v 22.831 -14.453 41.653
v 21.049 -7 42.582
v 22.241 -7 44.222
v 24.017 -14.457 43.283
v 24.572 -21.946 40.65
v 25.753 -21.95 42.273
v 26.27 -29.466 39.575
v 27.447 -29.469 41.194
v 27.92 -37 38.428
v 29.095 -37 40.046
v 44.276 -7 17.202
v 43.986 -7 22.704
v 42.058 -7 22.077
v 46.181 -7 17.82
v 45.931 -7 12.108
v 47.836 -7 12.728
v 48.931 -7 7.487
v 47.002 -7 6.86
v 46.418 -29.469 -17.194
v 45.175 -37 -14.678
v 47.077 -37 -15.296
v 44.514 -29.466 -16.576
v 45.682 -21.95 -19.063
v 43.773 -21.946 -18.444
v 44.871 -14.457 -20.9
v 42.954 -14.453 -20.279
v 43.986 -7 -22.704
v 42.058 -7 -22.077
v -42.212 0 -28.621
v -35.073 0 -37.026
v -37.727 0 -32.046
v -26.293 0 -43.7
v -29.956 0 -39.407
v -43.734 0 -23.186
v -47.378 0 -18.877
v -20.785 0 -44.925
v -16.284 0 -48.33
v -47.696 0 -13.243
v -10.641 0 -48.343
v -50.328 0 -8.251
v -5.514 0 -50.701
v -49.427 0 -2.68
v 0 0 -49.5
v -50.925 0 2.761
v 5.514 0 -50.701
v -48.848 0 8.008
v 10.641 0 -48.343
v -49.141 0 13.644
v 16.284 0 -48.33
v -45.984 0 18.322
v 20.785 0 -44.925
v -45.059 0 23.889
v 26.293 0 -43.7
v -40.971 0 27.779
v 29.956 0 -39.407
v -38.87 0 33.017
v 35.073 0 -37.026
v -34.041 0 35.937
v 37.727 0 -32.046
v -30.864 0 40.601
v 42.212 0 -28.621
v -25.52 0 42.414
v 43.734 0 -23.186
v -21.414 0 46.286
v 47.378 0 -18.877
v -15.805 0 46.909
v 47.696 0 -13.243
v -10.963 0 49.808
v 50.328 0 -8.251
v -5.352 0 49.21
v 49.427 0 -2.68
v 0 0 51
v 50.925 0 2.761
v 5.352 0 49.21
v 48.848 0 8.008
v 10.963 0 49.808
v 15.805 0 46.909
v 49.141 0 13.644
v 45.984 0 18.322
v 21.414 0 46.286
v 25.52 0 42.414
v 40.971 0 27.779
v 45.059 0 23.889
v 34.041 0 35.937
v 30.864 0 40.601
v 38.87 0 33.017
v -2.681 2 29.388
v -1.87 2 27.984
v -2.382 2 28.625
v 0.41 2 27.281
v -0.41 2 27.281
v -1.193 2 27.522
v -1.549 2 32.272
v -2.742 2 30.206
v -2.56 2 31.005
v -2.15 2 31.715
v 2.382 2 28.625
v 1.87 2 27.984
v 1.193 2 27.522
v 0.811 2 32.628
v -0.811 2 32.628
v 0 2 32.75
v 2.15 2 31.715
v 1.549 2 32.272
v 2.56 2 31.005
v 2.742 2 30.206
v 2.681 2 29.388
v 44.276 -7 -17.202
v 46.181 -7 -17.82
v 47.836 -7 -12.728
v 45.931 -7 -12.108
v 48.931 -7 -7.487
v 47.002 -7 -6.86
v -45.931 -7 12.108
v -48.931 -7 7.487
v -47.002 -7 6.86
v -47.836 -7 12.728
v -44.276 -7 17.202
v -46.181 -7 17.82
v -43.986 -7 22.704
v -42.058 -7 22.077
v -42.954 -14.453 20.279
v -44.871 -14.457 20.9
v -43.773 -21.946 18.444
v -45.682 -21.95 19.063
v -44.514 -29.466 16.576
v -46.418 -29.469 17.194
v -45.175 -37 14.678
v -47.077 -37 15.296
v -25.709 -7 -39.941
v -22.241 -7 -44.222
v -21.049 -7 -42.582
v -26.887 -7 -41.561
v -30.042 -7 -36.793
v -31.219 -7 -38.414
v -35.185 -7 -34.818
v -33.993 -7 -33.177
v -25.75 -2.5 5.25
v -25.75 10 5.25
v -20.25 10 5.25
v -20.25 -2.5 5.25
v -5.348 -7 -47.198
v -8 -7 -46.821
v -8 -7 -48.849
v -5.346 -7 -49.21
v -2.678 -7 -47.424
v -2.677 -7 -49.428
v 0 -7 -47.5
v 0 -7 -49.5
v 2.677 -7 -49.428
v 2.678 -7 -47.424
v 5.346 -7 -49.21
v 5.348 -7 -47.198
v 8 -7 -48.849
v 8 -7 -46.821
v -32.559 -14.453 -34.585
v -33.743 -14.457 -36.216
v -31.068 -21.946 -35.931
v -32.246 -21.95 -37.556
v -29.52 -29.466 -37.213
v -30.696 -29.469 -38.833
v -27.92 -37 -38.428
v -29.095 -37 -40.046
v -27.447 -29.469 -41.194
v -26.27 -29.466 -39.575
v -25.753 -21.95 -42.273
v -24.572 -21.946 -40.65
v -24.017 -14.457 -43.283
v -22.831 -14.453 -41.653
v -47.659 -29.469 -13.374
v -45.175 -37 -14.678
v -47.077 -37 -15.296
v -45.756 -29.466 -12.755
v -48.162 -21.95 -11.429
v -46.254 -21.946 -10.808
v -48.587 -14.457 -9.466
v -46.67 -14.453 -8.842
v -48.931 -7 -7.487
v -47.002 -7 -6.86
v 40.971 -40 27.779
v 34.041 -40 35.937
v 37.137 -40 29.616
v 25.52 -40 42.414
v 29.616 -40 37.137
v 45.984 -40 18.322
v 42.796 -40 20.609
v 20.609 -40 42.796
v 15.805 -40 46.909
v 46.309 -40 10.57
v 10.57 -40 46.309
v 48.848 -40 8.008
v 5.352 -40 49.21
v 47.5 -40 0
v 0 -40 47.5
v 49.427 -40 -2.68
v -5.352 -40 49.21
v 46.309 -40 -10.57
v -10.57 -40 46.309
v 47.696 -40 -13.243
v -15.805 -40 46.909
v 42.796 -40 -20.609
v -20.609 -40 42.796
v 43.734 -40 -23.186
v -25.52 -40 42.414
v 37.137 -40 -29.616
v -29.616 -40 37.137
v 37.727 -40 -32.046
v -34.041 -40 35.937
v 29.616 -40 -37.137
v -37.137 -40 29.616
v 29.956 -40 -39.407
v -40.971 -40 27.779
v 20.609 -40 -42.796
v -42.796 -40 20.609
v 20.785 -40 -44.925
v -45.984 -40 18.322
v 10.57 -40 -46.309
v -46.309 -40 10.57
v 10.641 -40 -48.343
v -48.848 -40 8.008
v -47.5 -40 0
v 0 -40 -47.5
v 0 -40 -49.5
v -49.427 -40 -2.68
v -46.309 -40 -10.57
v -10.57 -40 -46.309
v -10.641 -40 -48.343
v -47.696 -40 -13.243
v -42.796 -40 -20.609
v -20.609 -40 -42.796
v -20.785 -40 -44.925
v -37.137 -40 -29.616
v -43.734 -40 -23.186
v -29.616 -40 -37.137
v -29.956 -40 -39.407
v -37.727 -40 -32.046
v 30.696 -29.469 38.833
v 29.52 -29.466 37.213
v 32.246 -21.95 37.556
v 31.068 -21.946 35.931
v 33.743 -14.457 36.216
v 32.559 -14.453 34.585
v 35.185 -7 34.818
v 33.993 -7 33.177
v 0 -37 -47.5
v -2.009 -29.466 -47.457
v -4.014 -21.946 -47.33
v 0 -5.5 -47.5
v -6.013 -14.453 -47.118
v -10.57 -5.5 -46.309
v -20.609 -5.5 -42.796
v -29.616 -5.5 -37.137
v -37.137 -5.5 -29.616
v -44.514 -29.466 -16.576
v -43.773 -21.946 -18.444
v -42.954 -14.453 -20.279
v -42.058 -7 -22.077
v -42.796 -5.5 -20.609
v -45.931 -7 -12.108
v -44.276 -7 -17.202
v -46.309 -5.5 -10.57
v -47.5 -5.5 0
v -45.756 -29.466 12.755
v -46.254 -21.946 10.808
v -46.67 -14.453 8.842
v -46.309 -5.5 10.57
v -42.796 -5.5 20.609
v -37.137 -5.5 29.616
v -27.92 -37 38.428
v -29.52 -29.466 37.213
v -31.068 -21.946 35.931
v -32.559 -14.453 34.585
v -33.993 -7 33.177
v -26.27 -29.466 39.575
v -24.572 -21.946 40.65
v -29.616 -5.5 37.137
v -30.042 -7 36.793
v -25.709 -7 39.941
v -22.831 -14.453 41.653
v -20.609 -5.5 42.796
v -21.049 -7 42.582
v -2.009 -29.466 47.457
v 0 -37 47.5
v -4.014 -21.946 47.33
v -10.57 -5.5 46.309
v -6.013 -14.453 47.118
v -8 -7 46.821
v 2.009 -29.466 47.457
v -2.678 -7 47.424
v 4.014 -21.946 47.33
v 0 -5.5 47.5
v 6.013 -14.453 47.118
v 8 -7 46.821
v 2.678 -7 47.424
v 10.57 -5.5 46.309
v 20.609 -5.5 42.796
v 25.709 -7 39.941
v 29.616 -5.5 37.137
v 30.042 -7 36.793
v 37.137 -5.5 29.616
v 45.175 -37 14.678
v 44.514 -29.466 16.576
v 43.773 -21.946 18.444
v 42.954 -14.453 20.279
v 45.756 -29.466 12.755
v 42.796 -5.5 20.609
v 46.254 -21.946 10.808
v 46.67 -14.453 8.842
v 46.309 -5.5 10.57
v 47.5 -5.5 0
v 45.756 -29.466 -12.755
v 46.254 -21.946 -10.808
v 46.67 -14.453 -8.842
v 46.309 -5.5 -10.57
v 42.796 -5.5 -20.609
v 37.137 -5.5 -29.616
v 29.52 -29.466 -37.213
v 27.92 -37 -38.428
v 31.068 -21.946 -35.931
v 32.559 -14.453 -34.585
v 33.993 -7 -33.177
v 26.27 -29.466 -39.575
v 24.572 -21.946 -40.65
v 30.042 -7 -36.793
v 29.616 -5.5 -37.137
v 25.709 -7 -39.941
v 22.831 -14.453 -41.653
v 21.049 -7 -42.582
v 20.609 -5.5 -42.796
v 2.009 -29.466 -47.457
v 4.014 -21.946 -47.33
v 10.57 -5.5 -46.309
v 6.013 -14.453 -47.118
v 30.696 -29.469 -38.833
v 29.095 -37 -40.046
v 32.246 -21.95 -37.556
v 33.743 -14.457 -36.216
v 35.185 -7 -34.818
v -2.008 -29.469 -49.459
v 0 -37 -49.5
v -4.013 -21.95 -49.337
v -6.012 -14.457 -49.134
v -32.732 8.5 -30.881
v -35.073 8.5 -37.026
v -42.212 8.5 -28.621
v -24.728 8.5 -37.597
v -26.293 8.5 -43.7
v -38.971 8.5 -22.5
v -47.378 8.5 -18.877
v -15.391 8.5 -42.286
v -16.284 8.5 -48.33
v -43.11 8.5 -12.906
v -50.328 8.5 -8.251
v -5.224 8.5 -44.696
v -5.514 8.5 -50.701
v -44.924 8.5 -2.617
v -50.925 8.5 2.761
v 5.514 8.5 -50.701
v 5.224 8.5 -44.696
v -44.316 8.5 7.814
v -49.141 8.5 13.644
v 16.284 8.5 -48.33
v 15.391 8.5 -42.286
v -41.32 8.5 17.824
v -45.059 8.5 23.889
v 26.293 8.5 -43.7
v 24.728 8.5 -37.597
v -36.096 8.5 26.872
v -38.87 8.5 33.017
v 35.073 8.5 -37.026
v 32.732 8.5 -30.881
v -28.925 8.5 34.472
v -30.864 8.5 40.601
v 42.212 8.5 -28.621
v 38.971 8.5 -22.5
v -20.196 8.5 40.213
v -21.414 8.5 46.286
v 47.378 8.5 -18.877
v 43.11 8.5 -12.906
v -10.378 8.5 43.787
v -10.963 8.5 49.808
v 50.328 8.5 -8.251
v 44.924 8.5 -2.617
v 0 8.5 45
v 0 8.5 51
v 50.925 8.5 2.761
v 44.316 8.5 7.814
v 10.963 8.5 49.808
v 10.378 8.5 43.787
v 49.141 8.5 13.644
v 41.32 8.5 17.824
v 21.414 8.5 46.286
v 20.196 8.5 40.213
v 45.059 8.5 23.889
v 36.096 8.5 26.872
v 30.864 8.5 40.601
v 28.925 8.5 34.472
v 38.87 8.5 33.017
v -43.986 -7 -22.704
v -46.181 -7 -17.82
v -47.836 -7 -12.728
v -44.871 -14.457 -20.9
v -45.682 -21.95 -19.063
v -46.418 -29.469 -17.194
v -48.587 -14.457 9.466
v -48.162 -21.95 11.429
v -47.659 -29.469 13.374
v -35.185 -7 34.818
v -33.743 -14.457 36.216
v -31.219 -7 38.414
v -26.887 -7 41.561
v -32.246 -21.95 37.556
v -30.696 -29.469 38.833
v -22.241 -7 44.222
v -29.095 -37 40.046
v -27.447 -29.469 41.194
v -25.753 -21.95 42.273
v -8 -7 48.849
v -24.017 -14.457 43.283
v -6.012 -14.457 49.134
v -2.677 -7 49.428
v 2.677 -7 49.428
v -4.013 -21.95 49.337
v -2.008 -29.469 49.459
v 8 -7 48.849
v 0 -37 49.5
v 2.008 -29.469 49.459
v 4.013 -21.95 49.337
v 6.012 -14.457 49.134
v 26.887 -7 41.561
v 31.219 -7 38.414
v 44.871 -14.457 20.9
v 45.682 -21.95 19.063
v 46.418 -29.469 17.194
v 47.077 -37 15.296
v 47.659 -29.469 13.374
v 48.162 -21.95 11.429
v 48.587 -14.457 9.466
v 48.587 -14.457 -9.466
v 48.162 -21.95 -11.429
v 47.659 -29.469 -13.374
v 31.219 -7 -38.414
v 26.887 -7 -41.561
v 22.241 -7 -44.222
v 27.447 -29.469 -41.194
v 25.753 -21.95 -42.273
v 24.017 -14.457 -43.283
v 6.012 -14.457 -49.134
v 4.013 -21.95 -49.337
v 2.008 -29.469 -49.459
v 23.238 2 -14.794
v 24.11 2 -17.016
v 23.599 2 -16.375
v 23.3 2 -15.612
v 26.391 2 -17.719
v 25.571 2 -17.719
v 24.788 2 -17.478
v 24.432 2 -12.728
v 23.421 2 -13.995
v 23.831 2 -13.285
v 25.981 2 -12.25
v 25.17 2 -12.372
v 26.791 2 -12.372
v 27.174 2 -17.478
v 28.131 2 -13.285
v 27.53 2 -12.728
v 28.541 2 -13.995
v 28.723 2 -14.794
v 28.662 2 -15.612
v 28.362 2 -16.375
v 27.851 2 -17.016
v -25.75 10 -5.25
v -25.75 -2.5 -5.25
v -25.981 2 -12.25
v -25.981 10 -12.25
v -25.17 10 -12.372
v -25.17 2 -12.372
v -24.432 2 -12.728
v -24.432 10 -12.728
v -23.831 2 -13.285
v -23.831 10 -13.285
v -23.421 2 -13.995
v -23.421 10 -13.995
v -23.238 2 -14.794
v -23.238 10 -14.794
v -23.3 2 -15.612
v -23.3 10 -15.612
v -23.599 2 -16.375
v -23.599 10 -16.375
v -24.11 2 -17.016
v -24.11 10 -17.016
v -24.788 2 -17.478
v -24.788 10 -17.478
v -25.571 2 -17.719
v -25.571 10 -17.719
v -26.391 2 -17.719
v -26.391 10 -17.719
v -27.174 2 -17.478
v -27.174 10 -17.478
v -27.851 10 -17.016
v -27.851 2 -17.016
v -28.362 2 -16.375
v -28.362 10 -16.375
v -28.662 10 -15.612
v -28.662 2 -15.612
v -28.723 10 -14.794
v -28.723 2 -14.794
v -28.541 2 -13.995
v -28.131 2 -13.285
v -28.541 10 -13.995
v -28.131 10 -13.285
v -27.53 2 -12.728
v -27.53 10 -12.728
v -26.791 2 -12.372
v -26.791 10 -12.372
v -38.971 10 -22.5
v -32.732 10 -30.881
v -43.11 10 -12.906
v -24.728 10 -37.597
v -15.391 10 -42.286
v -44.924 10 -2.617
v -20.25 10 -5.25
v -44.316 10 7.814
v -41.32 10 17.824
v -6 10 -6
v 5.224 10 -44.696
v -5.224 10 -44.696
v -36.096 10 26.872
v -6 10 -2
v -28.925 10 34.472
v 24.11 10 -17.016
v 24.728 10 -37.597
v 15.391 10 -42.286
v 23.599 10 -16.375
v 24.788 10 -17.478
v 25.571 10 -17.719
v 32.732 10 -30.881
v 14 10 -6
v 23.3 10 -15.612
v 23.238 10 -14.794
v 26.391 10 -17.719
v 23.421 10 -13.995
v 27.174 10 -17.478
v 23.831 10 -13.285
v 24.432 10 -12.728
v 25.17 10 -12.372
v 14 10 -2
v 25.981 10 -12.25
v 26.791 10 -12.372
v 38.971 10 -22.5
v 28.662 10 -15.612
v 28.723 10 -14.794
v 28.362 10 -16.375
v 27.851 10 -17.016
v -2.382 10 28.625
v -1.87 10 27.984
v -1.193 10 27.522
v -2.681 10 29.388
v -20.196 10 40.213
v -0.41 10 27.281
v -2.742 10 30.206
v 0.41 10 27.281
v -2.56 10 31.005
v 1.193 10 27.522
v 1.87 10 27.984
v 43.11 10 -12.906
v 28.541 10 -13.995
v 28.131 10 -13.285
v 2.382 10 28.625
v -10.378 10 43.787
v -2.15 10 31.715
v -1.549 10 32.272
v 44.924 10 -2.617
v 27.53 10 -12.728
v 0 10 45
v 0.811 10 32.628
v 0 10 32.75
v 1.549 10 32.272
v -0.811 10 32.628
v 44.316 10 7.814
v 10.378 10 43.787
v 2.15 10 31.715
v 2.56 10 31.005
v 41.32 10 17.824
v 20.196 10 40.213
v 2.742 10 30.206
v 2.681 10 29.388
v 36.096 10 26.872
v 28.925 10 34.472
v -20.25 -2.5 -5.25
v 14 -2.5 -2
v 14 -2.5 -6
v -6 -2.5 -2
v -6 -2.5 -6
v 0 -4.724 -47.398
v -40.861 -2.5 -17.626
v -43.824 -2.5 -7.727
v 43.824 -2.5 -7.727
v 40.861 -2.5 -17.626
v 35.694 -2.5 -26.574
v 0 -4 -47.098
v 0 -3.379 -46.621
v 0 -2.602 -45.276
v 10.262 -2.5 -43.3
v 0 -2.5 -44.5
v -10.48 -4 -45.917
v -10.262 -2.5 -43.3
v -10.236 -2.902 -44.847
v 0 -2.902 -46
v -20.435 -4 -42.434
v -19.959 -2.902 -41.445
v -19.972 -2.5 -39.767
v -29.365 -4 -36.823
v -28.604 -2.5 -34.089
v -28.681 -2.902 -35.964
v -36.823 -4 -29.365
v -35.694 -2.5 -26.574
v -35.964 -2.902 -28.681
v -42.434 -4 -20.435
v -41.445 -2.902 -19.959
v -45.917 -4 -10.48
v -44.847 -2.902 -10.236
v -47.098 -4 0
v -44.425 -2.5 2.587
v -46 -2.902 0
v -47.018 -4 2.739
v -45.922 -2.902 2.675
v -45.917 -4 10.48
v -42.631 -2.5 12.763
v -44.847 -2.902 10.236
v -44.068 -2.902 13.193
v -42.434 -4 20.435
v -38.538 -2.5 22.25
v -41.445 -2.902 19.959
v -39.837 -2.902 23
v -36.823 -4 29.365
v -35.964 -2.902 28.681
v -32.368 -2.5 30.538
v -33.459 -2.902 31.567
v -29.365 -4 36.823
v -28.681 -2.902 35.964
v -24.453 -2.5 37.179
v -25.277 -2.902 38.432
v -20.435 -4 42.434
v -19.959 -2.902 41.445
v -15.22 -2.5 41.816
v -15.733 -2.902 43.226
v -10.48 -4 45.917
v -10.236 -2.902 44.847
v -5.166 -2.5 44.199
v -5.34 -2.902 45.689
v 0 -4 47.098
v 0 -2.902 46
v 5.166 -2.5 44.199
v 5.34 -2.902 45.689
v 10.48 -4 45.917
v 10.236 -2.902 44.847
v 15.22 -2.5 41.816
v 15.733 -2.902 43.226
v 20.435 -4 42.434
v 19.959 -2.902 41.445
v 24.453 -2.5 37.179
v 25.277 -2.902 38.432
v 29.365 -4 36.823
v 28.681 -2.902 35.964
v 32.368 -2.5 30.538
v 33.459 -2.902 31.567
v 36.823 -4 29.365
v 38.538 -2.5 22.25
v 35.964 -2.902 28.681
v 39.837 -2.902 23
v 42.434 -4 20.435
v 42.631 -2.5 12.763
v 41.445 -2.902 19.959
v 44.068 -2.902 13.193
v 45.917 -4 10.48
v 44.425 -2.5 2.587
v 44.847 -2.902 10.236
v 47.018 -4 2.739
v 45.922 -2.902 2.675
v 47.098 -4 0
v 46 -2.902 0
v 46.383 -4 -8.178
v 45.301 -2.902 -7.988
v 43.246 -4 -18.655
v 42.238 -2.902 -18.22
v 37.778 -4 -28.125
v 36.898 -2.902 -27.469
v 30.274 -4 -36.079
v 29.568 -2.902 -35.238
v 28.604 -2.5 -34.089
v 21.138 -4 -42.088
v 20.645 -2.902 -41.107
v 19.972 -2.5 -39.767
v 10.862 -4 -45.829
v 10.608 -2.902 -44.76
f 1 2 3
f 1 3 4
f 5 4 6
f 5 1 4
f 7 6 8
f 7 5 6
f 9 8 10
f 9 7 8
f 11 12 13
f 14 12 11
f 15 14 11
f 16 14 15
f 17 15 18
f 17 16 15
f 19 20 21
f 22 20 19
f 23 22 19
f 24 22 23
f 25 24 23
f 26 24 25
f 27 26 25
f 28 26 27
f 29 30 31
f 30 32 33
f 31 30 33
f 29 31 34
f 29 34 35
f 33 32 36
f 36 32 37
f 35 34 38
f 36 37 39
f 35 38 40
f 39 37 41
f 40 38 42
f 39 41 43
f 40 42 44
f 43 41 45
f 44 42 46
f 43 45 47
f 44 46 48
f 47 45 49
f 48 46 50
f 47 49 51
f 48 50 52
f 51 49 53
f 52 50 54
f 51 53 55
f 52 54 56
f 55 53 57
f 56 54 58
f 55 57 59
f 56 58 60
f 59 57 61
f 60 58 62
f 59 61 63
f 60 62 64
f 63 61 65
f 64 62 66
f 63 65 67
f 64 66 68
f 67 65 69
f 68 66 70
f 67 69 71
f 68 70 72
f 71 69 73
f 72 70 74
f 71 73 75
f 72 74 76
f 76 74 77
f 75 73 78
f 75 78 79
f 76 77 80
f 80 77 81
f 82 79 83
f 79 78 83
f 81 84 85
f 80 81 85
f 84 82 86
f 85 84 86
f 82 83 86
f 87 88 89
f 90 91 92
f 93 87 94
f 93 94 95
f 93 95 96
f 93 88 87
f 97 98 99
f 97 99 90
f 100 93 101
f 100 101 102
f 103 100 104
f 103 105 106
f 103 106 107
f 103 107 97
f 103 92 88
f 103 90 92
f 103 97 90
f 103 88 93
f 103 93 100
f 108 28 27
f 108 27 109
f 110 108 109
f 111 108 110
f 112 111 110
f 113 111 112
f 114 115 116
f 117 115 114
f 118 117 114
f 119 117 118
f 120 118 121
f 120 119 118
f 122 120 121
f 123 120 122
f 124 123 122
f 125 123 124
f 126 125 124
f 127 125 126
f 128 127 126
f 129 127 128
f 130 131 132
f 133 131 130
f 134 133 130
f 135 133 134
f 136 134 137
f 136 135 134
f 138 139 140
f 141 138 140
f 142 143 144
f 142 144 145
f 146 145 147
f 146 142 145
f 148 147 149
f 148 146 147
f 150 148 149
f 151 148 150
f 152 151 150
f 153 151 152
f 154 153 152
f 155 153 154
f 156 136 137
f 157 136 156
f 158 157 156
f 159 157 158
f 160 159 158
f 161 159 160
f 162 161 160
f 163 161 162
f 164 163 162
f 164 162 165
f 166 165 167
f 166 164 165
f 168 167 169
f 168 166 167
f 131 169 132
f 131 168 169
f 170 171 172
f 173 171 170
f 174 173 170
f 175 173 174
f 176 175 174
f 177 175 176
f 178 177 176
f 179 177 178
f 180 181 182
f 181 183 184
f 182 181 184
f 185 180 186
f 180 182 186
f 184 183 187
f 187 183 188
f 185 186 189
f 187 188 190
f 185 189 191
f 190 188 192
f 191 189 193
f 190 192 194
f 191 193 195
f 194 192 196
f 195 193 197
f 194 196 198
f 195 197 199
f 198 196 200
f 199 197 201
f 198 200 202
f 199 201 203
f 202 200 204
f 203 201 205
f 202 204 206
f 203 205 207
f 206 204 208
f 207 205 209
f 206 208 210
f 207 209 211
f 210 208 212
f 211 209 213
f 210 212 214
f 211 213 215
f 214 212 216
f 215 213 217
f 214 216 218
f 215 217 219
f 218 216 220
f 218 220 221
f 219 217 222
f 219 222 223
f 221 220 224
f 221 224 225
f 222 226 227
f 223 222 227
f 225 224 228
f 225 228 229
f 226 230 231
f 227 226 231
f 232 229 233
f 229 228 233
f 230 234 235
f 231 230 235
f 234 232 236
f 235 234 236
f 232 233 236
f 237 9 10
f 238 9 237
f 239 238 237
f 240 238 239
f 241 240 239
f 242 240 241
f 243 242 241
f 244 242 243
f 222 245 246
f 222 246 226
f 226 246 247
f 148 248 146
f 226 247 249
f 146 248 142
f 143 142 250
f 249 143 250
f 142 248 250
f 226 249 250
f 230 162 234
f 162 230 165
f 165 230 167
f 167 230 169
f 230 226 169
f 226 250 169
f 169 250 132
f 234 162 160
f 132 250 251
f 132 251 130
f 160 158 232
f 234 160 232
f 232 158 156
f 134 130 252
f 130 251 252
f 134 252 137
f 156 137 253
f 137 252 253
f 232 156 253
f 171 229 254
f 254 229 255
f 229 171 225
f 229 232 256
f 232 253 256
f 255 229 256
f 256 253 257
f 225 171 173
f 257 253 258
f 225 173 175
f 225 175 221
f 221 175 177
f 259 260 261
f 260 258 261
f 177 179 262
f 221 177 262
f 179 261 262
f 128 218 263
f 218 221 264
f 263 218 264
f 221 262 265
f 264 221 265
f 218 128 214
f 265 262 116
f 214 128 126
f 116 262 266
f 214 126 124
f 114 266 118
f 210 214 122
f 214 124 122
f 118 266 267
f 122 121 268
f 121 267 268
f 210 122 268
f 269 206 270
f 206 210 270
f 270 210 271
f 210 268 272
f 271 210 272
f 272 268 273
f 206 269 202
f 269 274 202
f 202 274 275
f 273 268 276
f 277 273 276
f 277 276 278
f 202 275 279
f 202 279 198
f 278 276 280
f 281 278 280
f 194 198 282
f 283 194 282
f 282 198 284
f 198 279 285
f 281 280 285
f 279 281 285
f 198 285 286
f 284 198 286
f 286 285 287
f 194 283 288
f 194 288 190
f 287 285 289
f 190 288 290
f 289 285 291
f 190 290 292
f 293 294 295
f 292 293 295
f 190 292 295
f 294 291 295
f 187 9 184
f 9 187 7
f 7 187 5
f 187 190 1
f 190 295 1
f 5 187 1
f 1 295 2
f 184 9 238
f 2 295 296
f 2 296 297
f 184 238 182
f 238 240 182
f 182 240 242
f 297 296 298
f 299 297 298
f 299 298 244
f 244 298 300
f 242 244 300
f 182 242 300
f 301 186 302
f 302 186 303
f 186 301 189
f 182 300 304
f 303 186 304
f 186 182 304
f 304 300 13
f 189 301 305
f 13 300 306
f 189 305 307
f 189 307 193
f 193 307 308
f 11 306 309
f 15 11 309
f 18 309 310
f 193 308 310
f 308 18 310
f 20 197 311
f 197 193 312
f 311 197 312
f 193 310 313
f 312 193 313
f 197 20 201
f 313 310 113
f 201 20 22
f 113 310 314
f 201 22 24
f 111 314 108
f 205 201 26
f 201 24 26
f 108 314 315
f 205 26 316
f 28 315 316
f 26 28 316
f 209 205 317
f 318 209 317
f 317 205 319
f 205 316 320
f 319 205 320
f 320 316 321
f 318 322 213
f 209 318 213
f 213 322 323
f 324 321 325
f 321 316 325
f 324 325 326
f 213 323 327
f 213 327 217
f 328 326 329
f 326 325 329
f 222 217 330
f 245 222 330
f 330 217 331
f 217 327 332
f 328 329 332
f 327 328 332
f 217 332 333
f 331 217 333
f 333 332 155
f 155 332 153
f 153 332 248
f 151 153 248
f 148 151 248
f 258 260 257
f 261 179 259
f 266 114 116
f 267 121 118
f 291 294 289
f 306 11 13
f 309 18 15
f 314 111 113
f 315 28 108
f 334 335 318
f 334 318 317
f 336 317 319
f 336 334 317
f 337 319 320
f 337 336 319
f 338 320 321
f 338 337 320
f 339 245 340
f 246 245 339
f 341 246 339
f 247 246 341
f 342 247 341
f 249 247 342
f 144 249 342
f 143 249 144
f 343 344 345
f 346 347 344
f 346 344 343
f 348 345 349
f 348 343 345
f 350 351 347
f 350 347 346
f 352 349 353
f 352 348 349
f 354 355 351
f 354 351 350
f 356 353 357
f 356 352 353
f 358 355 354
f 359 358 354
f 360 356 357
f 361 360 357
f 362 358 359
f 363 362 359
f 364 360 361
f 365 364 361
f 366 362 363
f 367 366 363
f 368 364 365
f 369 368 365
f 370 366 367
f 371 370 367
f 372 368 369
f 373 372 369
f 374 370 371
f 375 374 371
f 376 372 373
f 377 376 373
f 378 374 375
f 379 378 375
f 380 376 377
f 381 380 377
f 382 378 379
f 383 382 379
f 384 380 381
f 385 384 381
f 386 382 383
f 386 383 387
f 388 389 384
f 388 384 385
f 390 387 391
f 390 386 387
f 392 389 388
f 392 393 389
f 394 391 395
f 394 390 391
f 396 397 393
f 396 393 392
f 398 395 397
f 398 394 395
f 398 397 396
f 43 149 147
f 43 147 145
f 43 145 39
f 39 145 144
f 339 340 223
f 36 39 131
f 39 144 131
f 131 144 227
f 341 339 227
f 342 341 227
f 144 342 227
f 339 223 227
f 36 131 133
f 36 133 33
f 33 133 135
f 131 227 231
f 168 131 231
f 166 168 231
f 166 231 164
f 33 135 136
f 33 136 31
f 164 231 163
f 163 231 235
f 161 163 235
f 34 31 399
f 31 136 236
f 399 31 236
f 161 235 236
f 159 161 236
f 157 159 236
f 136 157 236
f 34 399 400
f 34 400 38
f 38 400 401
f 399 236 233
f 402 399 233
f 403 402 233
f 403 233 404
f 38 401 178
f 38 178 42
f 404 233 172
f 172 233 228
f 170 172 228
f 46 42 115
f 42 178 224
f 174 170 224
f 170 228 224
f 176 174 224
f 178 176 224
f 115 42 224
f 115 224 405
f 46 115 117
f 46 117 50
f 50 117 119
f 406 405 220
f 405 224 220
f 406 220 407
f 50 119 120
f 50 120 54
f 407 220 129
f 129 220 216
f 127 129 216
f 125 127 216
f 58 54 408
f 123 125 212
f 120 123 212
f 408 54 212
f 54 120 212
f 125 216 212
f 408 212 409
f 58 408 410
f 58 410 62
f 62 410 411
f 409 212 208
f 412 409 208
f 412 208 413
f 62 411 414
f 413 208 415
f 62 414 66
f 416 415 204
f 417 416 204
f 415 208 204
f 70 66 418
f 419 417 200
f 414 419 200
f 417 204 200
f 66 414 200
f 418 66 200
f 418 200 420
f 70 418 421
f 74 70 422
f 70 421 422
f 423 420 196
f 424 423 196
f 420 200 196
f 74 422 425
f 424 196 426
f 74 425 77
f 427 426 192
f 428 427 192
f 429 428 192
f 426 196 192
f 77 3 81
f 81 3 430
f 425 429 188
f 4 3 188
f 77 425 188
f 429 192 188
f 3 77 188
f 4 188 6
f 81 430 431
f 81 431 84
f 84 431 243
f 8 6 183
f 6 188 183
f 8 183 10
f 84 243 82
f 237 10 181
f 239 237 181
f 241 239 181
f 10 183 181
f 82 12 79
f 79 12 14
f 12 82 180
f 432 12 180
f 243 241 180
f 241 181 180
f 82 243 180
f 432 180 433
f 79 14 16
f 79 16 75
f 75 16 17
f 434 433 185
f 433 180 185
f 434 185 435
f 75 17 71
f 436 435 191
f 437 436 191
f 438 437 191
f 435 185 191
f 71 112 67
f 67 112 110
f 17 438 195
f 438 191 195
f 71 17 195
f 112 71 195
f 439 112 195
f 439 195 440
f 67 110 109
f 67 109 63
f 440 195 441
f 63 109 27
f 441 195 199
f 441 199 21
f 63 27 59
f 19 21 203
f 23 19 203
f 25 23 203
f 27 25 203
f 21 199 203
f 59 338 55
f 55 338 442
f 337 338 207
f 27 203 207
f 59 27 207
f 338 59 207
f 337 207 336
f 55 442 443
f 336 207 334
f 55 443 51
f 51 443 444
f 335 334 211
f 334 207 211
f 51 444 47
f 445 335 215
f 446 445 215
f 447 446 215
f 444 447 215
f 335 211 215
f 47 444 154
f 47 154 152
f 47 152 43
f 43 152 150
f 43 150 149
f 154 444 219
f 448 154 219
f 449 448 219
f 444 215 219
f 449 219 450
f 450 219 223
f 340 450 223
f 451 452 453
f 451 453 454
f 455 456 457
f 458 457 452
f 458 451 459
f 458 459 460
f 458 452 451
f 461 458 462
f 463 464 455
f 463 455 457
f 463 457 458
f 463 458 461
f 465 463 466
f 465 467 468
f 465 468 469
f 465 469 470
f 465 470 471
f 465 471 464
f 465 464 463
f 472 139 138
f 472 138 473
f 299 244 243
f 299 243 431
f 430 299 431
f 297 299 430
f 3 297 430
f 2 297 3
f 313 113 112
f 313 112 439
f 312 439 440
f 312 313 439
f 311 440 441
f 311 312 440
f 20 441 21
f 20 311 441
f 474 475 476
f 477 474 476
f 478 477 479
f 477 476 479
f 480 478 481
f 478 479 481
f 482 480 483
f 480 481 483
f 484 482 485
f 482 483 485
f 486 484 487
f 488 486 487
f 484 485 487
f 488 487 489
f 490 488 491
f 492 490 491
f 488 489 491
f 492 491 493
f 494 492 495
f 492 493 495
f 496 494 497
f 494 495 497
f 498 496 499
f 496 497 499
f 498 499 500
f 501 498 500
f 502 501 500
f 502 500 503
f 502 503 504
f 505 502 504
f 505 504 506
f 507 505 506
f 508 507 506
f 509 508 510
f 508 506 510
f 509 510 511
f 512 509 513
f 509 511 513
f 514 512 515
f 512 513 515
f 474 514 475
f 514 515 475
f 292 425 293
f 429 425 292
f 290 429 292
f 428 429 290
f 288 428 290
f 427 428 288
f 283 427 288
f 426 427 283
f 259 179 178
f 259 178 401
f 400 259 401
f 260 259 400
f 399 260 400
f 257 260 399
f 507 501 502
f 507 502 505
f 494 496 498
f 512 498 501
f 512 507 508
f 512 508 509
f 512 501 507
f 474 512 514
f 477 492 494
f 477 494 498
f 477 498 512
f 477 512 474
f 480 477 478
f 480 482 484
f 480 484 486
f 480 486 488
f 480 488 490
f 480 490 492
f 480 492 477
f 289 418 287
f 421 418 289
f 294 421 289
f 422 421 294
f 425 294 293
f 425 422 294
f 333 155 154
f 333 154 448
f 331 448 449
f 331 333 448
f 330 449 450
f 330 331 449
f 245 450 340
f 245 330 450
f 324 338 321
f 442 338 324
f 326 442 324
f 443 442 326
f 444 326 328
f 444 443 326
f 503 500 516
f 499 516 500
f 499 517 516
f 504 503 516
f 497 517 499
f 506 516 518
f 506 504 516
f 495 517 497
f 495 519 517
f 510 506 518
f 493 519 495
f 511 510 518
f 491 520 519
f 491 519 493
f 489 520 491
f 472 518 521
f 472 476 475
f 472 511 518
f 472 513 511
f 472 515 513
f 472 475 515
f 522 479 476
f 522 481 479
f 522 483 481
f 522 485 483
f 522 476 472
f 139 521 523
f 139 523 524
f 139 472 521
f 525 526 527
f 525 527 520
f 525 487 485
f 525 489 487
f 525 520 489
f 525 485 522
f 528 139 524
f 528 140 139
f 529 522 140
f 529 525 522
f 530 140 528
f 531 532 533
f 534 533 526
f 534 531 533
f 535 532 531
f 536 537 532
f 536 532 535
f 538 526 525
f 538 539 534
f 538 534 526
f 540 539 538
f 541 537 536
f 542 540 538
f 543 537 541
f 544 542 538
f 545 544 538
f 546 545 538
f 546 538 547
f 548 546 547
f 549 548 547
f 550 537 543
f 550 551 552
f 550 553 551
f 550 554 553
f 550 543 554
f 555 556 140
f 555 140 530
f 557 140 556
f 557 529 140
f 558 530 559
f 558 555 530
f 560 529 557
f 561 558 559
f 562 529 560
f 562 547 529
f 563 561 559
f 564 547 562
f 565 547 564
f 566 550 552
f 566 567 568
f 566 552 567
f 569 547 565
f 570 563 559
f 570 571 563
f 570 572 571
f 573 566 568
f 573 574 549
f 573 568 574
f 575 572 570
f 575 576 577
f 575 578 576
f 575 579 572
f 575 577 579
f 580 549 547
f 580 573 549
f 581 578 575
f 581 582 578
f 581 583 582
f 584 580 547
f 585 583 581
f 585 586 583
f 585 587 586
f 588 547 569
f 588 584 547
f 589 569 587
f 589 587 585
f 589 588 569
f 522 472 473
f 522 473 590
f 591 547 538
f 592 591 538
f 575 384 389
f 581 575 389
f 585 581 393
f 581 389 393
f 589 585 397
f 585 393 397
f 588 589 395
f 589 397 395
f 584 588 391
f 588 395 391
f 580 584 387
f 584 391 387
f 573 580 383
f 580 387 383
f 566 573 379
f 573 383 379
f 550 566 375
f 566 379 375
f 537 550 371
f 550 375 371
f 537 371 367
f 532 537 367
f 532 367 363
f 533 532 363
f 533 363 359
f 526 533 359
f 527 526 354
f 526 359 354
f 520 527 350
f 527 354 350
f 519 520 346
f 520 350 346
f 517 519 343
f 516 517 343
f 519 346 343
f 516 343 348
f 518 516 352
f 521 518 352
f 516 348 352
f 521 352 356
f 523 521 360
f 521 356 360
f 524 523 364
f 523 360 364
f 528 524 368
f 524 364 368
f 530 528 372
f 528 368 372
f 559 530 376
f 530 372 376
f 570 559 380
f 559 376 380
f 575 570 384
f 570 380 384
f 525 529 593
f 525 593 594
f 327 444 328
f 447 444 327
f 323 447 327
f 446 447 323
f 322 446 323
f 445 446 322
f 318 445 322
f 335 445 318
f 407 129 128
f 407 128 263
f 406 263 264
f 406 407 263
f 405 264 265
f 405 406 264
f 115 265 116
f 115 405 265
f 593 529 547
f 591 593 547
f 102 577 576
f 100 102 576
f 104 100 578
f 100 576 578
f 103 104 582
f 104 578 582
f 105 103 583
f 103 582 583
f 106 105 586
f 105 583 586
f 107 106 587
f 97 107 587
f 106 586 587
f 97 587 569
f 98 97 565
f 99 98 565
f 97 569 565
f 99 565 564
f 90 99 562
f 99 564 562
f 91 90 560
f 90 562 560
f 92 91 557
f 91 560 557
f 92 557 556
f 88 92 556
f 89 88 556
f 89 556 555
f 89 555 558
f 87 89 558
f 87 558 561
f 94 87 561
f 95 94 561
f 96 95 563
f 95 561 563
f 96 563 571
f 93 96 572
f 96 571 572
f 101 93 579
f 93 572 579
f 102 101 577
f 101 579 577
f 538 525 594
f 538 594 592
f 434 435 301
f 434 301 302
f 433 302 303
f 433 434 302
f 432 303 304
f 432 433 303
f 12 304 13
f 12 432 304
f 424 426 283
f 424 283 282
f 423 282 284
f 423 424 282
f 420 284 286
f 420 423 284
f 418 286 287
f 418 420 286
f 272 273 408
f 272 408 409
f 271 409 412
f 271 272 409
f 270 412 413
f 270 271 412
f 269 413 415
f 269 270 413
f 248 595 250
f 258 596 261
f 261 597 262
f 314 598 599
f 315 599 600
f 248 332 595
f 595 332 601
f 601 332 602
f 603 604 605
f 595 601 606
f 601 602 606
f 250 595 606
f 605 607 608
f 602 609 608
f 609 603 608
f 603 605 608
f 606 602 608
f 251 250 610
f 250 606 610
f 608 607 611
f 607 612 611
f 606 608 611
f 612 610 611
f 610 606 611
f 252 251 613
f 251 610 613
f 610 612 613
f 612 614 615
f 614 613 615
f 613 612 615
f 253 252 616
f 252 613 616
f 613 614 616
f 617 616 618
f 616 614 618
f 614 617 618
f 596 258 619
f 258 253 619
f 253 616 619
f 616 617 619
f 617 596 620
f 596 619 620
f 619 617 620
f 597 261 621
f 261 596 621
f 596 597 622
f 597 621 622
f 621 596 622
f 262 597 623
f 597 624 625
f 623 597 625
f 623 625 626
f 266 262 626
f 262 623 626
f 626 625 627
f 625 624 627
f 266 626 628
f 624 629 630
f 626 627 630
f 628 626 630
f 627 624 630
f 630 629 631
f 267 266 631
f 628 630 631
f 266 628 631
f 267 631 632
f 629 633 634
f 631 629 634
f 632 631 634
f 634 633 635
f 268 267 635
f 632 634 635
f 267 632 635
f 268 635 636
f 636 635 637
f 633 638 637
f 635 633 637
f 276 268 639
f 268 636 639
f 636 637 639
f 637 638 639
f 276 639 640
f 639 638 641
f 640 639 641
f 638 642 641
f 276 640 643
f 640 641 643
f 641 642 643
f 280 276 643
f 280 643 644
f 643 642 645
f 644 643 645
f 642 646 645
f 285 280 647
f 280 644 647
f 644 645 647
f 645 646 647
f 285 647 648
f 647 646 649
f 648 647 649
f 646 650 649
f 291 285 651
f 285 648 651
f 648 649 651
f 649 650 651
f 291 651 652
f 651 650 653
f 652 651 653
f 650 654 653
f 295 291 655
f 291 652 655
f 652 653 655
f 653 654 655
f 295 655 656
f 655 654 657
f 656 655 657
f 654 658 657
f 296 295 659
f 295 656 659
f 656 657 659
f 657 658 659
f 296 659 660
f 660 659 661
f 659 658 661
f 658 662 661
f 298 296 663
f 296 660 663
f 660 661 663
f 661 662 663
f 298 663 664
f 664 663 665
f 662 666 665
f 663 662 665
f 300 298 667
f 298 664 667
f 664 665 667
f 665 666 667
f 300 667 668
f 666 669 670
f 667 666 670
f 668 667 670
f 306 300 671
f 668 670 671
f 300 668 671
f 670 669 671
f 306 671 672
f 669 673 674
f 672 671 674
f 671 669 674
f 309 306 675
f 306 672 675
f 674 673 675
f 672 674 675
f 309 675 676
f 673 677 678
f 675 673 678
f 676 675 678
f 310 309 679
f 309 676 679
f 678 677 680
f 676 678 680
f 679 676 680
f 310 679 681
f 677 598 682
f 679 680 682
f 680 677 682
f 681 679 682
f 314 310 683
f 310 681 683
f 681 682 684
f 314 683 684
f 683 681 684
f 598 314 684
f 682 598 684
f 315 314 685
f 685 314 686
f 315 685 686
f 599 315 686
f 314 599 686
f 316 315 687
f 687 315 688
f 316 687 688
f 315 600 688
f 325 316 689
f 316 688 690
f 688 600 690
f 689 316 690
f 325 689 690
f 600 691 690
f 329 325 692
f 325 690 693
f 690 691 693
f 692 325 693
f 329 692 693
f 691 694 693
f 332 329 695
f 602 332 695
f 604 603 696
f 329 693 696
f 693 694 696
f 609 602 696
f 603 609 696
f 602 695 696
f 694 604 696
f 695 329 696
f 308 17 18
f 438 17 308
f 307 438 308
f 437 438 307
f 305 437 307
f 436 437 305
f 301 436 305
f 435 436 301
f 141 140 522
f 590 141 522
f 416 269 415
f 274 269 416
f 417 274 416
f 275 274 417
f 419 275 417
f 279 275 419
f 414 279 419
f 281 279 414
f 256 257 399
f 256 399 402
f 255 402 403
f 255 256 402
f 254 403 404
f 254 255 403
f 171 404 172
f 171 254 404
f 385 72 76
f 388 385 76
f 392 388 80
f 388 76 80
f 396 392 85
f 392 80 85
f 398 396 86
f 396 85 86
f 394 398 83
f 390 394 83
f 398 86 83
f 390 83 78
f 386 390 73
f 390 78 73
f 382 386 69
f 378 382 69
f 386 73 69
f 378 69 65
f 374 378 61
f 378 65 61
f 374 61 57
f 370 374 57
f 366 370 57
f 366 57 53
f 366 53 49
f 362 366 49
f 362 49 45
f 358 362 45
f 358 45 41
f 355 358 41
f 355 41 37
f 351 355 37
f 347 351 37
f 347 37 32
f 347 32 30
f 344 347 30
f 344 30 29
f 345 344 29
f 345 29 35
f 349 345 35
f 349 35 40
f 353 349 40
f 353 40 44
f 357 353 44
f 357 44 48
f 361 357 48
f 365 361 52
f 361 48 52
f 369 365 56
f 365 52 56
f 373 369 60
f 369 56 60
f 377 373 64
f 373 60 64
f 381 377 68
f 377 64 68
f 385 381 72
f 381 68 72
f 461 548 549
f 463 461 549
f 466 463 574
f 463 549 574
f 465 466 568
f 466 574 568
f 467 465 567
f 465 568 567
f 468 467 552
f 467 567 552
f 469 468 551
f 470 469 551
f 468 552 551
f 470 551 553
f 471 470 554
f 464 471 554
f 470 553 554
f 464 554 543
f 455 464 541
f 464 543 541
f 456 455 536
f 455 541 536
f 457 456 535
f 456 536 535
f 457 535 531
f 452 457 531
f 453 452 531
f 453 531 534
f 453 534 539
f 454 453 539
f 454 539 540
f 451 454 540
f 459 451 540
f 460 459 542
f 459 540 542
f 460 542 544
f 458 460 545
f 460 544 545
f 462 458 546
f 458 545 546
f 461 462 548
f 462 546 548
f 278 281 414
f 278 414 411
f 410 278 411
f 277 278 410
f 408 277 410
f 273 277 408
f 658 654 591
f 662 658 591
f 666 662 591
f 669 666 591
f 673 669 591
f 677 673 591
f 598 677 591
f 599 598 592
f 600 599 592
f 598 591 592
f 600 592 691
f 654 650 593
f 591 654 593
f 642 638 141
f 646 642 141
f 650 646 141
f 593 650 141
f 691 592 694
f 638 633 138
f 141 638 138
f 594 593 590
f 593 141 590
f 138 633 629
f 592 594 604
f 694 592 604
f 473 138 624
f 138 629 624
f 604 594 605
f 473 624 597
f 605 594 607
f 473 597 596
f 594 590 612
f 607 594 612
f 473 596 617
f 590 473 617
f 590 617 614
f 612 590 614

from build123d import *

# Parameters (mm, degrees)
CUT_EXTRUDE_578_DEPTH      = 70.85
PATTERN_CIRCULAR_632_COUNT = 5
SKETCH_7_R                 = 51
EXTRUDE_1_DEPTH            = 10
CUT_EXTRUDE_START          = -1.5
SKETCH_8_R                 = 51
SKETCH_8_R_2               = 45
CUT_EXTRUDE_1_DEPTH        = 1.5
SKETCH_10_R                = 2.75
CUT_EXTRUDE_5_DEPTH        = 8
CUT_EXTRUDE_6_REACH        = 89.761
SKETCH_11_W                = 20
SKETCH_11_H                = 4
SKETCH_11_W_2              = 5.5
SKETCH_11_H_2              = 10.5


with BuildPart() as part:
    # Эскиз2 → Revolve 375 (revolve)
    with BuildSketch(Plane.XY, mode=Mode.PRIVATE) as revolve_375_sk:
        with BuildLine():
            Line((0, 0), (-49.5, 0))
            Line((-49.5, 0), (-49.5, -40))
            Line((-49.5, -40), (-47.5, -40))
            Line((-47.5, -40), (-47.5, -5.5))
            ThreePointArc((-47.5, -5.5), (-46.621320344, -3.378679656), (-44.5, -2.5))
            Line((-44.5, -2.5), (0, -2.5))
            Line((0, -2.5), (0, 0))
        make_face()
    revolve(revolve_375_sk.sketch.rotate(Axis((0, 0, 0), (0, 1, 0)), 270), axis=Axis((0, 0, 0), (0, 1, 0)))

    # Эскиз4 → Cut-Extrude 578 (cut, symmetric)
    with BuildSketch(Plane.XY):
        Polygon((-8, -7), (8, -7), (0, -37), align=None)
    cut_extrude_578 = extrude(amount=CUT_EXTRUDE_578_DEPTH, both=True, mode=Mode.SUBTRACT)

    # Pattern Circular 632: Cut-Extrude 578 ×5 about axis
    pattern_circular_632_axis = Axis((0, 0, 0), (0, 1, 0))
    for i in range(1, PATTERN_CIRCULAR_632_COUNT):
        add(cut_extrude_578.rotate(pattern_circular_632_axis, i * 360 / PATTERN_CIRCULAR_632_COUNT), mode=Mode.SUBTRACT)

    # Эскиз7 → Бобышка-Вытянуть1 (add)
    with BuildSketch(Plane(origin=(0, 0, 0), x_dir=(1, 0, 0), z_dir=(0, 1, 0))):
        with Locations(Location((0, 0, 0), (0, 0, 270))):
            Circle(SKETCH_7_R)
    extrude(amount=EXTRUDE_1_DEPTH)

    # Эскиз8 → Вырез-Вытянуть1 (cut)
    with BuildSketch(Plane(origin=(0, 10, 0), x_dir=(1, 0, 0), z_dir=(0, 1, 0)).offset(CUT_EXTRUDE_START)):
        with Locations(Location((0, 0, 0), (0, 0, 270))):
            Circle(SKETCH_8_R)
        with Locations(Location((0, 0, 0), (0, 0, 270))):
            Circle(SKETCH_8_R_2, mode=Mode.SUBTRACT)
    extrude(amount=CUT_EXTRUDE_1_DEPTH, mode=Mode.SUBTRACT)

    # Эскиз10 → Вырез-Вытянуть5 (cut)
    with BuildSketch(Plane(origin=(0, 10, 0), x_dir=(1, 0, 0), z_dir=(0, 1, 0))):
        with Locations(Location((0, -30, 0), (0, 0, 270))):
            Circle(SKETCH_10_R)
        with Locations(Location((-25.980762114, 15, 0), (0, 0, 270))):
            Circle(SKETCH_10_R)
        with Locations(Location((25.980762114, 15, 0), (0, 0, 270))):
            Circle(SKETCH_10_R)
    extrude(amount=-CUT_EXTRUDE_5_DEPTH, mode=Mode.SUBTRACT)

    # Эскиз11 → Вырез-Вытянуть6 (cut, up to next)
    with BuildSketch(Plane(origin=(0, 10, 0), x_dir=(1, 0, 0), z_dir=(0, 1, 0)), mode=Mode.PRIVATE) as cut_extrude_6_sk1:
        with Locations((4, 4)):
            Rectangle(SKETCH_11_W, SKETCH_11_H)
    cut_extrude_6_tool1 = extrude(cut_extrude_6_sk1.sketch, amount=-CUT_EXTRUDE_6_REACH, mode=Mode.PRIVATE) & part.part
    # Эскиз11 → Вырез-Вытянуть6 (cut, up to next)
    with BuildSketch(Plane(origin=(0, 10, 0), x_dir=(1, 0, 0), z_dir=(0, 1, 0)), mode=Mode.PRIVATE) as cut_extrude_6_sk2:
        with Locations((-23, 0)):
            Rectangle(SKETCH_11_W_2, SKETCH_11_H_2)
    cut_extrude_6_tool2 = extrude(cut_extrude_6_sk2.sketch, amount=-CUT_EXTRUDE_6_REACH, mode=Mode.PRIVATE) & part.part
    add(cut_extrude_6_tool1.solids().sort_by_distance((4, 10, -4))[0], mode=Mode.SUBTRACT)
    add(cut_extrude_6_tool2.solids().sort_by_distance((-23, 10, 0))[0], mode=Mode.SUBTRACT)


solid = part.part
